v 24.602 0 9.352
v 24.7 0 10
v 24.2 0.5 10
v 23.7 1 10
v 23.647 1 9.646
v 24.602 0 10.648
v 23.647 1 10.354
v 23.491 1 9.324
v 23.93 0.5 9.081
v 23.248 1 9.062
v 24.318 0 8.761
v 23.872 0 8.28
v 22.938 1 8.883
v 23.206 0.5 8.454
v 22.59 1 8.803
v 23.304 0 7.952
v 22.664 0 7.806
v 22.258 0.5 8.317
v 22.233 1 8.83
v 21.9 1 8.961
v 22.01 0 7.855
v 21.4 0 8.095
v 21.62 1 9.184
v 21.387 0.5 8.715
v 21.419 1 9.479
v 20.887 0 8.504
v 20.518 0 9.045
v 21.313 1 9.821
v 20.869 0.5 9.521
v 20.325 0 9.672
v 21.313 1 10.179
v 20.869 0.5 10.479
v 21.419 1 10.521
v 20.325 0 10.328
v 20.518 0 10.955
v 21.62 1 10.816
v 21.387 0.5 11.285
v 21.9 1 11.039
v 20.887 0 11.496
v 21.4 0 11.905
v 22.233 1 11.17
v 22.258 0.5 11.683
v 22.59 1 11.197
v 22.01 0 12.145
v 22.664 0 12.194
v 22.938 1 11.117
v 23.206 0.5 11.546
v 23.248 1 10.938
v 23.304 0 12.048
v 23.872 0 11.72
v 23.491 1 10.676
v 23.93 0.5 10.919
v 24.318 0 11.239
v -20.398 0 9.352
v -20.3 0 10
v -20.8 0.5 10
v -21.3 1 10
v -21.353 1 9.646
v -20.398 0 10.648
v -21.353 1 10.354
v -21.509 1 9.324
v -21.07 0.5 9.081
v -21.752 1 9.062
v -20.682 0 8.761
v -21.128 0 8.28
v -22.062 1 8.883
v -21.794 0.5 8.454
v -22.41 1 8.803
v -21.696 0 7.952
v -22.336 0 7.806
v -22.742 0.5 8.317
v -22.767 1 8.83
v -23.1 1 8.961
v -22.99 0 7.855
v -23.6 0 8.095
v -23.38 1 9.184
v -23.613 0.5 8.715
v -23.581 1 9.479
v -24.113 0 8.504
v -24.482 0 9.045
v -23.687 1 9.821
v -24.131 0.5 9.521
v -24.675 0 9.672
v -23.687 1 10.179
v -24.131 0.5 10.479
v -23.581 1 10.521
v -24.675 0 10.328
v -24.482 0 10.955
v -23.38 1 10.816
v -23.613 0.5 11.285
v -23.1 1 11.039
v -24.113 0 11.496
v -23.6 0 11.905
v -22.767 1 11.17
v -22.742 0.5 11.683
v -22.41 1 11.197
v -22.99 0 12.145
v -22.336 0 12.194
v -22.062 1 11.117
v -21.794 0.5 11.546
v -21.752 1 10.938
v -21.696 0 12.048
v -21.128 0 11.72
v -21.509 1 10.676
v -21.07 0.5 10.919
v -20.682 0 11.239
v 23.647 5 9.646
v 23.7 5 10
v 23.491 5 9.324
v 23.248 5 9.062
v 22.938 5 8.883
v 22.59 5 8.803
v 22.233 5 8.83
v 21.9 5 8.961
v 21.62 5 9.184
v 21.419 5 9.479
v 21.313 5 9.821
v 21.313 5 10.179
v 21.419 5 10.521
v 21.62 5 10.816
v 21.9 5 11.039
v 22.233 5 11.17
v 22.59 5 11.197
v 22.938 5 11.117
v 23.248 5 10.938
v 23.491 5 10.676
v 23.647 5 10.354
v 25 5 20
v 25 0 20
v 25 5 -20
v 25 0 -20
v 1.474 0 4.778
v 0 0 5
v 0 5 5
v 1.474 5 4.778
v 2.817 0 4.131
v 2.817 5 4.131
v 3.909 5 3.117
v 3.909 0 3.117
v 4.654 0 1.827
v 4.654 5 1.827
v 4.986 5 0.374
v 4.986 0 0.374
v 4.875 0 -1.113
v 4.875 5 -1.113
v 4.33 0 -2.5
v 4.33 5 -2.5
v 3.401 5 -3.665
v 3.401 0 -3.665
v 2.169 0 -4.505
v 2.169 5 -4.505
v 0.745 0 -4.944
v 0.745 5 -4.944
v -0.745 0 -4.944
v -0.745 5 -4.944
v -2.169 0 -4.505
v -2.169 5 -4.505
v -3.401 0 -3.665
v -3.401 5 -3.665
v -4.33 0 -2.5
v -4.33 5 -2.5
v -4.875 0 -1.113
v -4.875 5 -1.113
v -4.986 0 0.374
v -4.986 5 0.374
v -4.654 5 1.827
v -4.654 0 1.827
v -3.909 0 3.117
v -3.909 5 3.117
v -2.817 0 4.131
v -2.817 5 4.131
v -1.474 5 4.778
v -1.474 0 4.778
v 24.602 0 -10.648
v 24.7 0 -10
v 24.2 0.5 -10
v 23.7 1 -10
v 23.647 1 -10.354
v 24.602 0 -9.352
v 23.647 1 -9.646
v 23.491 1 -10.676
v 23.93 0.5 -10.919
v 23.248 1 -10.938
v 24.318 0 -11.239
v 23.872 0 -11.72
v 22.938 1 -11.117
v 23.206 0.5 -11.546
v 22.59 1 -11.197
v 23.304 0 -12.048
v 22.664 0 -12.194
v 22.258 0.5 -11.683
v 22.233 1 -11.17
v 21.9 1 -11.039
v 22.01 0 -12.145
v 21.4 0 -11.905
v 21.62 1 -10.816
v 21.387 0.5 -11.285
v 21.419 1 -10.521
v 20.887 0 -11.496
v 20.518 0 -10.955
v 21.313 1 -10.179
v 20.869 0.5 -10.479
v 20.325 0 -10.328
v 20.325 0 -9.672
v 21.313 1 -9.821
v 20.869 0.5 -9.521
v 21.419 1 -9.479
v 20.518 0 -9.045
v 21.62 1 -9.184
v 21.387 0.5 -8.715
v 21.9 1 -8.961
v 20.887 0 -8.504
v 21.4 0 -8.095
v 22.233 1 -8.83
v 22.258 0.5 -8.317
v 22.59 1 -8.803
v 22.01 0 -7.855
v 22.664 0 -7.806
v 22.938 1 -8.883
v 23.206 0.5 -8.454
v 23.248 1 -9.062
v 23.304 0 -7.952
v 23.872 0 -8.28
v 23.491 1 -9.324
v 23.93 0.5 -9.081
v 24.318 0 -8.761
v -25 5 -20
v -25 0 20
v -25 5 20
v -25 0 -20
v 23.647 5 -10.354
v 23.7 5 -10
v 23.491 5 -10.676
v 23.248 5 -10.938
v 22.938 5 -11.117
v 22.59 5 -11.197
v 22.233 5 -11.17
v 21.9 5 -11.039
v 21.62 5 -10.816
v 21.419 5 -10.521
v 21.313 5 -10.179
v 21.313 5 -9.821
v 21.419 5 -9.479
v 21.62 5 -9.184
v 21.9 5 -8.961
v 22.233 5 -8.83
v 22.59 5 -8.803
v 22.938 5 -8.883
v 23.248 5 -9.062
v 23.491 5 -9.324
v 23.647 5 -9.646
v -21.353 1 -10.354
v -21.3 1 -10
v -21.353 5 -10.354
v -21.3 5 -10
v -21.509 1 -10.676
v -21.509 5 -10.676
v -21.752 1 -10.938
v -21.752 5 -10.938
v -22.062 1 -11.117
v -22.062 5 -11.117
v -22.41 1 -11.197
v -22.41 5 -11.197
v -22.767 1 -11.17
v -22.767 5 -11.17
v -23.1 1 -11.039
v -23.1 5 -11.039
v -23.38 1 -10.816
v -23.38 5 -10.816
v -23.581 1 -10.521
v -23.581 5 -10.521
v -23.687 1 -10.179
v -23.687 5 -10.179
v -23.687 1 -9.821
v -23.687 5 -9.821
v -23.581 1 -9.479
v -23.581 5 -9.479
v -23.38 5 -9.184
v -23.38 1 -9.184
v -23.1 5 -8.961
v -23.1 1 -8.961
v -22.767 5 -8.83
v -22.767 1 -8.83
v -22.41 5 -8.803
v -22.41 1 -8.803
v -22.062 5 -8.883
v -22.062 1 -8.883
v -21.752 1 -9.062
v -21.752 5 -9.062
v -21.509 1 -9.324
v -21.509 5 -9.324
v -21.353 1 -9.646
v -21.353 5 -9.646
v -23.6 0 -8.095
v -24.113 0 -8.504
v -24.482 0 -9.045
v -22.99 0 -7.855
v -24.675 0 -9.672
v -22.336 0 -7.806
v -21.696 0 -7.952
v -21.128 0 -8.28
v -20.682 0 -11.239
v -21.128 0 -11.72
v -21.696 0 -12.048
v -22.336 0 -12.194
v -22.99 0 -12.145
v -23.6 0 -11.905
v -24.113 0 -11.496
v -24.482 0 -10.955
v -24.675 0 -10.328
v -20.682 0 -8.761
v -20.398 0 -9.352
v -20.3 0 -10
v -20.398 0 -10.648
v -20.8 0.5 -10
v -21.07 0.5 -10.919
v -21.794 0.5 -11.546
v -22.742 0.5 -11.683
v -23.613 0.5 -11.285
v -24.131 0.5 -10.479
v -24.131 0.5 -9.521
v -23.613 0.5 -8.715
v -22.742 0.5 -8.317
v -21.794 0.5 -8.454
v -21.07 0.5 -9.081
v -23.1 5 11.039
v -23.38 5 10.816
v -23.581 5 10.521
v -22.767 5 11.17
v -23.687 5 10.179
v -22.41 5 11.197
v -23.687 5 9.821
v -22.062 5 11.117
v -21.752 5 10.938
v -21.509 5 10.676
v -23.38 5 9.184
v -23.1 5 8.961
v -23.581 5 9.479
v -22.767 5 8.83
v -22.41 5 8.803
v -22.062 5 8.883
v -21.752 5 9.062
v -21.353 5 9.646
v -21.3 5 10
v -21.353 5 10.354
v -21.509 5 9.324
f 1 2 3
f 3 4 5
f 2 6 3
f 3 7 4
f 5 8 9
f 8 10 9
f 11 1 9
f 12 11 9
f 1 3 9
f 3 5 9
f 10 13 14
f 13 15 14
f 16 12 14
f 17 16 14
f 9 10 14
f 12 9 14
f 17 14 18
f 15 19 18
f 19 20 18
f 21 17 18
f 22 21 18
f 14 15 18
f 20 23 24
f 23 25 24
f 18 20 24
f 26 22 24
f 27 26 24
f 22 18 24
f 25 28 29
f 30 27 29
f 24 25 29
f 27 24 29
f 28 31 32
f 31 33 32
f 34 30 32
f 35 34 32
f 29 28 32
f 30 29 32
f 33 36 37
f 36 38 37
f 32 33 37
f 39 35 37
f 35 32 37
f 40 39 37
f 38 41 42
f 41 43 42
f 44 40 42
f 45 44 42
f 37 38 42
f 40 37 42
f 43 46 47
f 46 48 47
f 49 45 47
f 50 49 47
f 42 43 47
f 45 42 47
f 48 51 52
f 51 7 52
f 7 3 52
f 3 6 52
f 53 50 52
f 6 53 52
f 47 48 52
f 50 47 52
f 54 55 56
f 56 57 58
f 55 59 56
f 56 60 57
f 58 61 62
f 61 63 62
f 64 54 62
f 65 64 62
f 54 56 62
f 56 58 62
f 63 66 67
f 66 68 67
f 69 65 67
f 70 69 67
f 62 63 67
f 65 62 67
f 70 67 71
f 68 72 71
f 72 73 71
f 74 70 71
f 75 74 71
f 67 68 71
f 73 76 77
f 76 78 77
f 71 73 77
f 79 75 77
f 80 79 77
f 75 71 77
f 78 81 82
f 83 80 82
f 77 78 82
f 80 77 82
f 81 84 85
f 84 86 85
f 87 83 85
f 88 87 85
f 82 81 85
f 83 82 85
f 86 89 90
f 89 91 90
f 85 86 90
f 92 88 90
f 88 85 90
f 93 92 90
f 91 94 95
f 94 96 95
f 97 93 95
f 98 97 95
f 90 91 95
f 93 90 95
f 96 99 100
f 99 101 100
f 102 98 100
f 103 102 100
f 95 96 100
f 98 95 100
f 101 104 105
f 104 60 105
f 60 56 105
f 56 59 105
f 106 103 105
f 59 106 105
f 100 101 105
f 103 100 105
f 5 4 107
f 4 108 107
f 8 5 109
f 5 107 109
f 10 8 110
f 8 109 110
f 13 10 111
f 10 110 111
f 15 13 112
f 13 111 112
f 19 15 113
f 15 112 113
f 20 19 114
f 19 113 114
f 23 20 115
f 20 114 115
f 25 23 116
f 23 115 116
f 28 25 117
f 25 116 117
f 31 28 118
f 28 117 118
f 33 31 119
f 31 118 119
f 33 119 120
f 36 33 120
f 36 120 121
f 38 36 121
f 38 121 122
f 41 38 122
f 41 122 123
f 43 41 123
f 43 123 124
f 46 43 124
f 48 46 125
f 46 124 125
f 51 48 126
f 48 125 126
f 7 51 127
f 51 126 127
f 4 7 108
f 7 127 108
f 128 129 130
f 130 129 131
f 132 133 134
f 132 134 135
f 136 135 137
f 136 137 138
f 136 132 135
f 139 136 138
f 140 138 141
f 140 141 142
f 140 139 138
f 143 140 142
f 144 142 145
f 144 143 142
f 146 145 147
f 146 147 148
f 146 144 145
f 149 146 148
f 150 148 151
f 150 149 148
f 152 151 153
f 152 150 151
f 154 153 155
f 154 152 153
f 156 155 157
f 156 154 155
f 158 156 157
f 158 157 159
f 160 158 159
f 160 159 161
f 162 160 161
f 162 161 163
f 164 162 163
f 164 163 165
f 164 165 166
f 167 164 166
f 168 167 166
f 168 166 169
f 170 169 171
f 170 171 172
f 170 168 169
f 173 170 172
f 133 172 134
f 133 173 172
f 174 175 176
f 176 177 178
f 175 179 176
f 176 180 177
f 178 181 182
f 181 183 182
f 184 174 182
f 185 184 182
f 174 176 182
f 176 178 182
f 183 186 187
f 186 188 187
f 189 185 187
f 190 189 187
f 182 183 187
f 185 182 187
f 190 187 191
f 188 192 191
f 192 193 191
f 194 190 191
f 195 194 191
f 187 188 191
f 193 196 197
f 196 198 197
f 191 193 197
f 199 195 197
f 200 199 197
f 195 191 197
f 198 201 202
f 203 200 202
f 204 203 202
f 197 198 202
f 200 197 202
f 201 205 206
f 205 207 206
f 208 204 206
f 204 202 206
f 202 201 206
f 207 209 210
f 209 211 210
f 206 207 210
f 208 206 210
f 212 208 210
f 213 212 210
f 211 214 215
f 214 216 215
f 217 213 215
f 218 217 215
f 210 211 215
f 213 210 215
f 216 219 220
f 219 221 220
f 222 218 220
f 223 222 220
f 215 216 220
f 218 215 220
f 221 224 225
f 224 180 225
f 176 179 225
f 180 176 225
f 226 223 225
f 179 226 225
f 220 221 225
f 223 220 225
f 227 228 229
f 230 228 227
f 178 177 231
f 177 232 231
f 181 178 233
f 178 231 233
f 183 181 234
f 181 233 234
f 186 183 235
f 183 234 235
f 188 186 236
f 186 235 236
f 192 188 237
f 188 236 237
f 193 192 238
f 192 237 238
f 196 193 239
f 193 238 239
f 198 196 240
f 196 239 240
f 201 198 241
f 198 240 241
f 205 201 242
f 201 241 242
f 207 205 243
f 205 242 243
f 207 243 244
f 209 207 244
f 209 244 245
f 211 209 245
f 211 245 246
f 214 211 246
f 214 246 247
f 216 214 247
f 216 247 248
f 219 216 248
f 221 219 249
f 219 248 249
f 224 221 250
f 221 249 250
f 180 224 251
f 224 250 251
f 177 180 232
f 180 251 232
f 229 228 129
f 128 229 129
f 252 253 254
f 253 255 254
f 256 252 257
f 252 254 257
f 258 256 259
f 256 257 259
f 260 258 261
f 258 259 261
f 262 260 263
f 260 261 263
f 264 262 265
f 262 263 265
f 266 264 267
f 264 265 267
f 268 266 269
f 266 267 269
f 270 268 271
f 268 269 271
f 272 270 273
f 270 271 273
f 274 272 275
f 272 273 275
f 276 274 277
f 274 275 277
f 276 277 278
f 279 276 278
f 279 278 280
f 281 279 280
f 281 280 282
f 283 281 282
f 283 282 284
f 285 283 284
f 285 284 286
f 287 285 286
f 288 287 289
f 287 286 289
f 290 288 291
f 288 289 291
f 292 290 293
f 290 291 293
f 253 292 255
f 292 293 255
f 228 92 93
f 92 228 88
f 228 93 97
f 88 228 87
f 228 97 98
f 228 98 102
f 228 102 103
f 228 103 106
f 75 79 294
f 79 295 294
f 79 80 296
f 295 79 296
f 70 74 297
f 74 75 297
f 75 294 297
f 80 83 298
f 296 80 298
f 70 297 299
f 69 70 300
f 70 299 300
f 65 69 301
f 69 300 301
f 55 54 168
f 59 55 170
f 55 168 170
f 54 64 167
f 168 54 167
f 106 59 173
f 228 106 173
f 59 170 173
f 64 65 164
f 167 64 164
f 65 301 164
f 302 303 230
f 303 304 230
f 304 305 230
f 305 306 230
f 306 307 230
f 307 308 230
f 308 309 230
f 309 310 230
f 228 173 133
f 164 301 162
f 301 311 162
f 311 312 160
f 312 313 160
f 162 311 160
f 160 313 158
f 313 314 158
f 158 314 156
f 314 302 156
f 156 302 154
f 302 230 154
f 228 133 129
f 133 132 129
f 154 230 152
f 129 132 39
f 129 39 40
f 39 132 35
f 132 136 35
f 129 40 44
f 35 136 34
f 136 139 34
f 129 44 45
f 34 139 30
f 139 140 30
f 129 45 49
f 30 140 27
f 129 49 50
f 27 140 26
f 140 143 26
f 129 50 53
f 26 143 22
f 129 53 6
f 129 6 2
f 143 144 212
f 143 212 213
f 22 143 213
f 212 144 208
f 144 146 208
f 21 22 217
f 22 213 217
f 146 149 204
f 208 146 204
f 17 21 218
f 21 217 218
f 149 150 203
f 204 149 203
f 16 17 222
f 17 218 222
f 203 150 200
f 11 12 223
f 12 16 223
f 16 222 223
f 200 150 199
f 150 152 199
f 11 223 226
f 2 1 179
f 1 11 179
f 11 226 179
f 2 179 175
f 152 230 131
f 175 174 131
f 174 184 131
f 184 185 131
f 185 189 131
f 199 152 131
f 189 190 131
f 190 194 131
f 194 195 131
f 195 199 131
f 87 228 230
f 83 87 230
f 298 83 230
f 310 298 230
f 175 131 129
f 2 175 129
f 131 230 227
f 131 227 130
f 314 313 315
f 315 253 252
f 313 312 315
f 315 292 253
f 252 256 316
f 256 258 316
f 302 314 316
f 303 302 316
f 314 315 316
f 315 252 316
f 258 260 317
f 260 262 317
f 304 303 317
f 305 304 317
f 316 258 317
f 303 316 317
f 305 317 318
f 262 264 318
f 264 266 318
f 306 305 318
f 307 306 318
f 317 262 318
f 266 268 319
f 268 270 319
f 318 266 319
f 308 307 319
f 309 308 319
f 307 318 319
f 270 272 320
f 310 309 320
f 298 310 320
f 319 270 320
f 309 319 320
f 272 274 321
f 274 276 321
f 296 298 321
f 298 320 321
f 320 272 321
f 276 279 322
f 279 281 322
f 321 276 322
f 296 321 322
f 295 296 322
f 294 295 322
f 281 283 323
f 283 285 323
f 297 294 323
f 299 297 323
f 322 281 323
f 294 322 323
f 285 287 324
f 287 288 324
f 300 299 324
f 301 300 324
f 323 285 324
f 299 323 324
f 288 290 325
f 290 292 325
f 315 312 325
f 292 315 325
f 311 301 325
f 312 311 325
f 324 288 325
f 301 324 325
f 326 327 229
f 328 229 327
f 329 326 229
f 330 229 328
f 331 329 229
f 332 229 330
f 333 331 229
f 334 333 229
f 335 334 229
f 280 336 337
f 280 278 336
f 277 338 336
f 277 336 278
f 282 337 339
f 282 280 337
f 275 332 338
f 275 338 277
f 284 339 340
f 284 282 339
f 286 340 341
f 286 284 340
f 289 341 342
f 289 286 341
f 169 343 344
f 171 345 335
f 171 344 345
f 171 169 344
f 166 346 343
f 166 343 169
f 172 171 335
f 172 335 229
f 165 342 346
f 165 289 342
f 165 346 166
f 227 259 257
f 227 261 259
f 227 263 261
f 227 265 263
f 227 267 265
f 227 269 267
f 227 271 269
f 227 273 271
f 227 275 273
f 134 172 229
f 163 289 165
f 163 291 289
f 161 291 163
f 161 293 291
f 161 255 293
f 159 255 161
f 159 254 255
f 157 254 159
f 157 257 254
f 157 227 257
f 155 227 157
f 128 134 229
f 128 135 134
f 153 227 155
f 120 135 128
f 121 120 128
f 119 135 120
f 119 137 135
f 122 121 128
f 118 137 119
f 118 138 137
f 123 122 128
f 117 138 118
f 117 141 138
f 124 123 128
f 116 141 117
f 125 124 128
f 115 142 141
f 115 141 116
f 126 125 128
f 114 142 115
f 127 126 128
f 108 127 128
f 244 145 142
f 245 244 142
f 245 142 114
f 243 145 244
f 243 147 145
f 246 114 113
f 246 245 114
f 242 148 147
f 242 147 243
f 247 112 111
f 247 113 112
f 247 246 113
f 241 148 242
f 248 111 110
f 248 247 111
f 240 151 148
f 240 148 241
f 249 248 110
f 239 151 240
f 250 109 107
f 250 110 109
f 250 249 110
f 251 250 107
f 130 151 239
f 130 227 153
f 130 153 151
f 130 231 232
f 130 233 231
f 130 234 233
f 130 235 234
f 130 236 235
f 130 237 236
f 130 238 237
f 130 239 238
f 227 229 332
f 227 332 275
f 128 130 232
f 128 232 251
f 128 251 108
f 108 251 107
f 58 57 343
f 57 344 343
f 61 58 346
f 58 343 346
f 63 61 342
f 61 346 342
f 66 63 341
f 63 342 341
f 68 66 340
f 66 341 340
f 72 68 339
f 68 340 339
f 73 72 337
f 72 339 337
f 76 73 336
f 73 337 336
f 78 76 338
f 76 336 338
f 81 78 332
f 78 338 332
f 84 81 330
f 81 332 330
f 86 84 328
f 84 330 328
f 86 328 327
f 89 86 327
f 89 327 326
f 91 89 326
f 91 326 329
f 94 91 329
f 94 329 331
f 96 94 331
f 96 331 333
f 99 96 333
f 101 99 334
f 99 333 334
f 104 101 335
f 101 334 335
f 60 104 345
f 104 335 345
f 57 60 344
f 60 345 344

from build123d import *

# Parameters (mm, degrees)
SKETCH1_W                                           = 50
SKETCH1_H                                           = 40
SKETCH1_R                                           = 5
BOSS_EXTRUDE1_DEPTH                                 = 5
CSK_FOR_M2_COUNTERSUNK_FLAT_HEAD_SCREW1_D           = 2.4
CSK_FOR_M2_COUNTERSUNK_FLAT_HEAD_SCREW1_CSINK_D     = 4.4
CSK_FOR_M2_COUNTERSUNK_FLAT_HEAD_SCREW1_CSINK_ANGLE = 90


with BuildPart() as part:
    # Sketch1 → Boss-Extrude1 (new body)
    with BuildSketch(Plane(origin=(0, 0, 0), x_dir=(1, 0, 0), z_dir=(0, 1, 0))):
        Rectangle(SKETCH1_W, SKETCH1_H)
        with Locations(Location((0, 0, 0), (0, 0, 270))):
            Circle(SKETCH1_R, mode=Mode.SUBTRACT)
    extrude(amount=BOSS_EXTRUDE1_DEPTH)

    # CSK for M2 Countersunk Flat Head Screw1 (through all)
    with Locations(Plane(origin=(0, 0, 0), x_dir=(-1, 0, 0), z_dir=(0, -1, 0))):
        with Locations((22.5, -10), (22.5, 10), (-22.5, 10), (-22.5, -10)):
            CounterSinkHole(CSK_FOR_M2_COUNTERSUNK_FLAT_HEAD_SCREW1_D / 2, CSK_FOR_M2_COUNTERSUNK_FLAT_HEAD_SCREW1_CSINK_D / 2, counter_sink_angle=CSK_FOR_M2_COUNTERSUNK_FLAT_HEAD_SCREW1_CSINK_ANGLE)


solid = part.part
